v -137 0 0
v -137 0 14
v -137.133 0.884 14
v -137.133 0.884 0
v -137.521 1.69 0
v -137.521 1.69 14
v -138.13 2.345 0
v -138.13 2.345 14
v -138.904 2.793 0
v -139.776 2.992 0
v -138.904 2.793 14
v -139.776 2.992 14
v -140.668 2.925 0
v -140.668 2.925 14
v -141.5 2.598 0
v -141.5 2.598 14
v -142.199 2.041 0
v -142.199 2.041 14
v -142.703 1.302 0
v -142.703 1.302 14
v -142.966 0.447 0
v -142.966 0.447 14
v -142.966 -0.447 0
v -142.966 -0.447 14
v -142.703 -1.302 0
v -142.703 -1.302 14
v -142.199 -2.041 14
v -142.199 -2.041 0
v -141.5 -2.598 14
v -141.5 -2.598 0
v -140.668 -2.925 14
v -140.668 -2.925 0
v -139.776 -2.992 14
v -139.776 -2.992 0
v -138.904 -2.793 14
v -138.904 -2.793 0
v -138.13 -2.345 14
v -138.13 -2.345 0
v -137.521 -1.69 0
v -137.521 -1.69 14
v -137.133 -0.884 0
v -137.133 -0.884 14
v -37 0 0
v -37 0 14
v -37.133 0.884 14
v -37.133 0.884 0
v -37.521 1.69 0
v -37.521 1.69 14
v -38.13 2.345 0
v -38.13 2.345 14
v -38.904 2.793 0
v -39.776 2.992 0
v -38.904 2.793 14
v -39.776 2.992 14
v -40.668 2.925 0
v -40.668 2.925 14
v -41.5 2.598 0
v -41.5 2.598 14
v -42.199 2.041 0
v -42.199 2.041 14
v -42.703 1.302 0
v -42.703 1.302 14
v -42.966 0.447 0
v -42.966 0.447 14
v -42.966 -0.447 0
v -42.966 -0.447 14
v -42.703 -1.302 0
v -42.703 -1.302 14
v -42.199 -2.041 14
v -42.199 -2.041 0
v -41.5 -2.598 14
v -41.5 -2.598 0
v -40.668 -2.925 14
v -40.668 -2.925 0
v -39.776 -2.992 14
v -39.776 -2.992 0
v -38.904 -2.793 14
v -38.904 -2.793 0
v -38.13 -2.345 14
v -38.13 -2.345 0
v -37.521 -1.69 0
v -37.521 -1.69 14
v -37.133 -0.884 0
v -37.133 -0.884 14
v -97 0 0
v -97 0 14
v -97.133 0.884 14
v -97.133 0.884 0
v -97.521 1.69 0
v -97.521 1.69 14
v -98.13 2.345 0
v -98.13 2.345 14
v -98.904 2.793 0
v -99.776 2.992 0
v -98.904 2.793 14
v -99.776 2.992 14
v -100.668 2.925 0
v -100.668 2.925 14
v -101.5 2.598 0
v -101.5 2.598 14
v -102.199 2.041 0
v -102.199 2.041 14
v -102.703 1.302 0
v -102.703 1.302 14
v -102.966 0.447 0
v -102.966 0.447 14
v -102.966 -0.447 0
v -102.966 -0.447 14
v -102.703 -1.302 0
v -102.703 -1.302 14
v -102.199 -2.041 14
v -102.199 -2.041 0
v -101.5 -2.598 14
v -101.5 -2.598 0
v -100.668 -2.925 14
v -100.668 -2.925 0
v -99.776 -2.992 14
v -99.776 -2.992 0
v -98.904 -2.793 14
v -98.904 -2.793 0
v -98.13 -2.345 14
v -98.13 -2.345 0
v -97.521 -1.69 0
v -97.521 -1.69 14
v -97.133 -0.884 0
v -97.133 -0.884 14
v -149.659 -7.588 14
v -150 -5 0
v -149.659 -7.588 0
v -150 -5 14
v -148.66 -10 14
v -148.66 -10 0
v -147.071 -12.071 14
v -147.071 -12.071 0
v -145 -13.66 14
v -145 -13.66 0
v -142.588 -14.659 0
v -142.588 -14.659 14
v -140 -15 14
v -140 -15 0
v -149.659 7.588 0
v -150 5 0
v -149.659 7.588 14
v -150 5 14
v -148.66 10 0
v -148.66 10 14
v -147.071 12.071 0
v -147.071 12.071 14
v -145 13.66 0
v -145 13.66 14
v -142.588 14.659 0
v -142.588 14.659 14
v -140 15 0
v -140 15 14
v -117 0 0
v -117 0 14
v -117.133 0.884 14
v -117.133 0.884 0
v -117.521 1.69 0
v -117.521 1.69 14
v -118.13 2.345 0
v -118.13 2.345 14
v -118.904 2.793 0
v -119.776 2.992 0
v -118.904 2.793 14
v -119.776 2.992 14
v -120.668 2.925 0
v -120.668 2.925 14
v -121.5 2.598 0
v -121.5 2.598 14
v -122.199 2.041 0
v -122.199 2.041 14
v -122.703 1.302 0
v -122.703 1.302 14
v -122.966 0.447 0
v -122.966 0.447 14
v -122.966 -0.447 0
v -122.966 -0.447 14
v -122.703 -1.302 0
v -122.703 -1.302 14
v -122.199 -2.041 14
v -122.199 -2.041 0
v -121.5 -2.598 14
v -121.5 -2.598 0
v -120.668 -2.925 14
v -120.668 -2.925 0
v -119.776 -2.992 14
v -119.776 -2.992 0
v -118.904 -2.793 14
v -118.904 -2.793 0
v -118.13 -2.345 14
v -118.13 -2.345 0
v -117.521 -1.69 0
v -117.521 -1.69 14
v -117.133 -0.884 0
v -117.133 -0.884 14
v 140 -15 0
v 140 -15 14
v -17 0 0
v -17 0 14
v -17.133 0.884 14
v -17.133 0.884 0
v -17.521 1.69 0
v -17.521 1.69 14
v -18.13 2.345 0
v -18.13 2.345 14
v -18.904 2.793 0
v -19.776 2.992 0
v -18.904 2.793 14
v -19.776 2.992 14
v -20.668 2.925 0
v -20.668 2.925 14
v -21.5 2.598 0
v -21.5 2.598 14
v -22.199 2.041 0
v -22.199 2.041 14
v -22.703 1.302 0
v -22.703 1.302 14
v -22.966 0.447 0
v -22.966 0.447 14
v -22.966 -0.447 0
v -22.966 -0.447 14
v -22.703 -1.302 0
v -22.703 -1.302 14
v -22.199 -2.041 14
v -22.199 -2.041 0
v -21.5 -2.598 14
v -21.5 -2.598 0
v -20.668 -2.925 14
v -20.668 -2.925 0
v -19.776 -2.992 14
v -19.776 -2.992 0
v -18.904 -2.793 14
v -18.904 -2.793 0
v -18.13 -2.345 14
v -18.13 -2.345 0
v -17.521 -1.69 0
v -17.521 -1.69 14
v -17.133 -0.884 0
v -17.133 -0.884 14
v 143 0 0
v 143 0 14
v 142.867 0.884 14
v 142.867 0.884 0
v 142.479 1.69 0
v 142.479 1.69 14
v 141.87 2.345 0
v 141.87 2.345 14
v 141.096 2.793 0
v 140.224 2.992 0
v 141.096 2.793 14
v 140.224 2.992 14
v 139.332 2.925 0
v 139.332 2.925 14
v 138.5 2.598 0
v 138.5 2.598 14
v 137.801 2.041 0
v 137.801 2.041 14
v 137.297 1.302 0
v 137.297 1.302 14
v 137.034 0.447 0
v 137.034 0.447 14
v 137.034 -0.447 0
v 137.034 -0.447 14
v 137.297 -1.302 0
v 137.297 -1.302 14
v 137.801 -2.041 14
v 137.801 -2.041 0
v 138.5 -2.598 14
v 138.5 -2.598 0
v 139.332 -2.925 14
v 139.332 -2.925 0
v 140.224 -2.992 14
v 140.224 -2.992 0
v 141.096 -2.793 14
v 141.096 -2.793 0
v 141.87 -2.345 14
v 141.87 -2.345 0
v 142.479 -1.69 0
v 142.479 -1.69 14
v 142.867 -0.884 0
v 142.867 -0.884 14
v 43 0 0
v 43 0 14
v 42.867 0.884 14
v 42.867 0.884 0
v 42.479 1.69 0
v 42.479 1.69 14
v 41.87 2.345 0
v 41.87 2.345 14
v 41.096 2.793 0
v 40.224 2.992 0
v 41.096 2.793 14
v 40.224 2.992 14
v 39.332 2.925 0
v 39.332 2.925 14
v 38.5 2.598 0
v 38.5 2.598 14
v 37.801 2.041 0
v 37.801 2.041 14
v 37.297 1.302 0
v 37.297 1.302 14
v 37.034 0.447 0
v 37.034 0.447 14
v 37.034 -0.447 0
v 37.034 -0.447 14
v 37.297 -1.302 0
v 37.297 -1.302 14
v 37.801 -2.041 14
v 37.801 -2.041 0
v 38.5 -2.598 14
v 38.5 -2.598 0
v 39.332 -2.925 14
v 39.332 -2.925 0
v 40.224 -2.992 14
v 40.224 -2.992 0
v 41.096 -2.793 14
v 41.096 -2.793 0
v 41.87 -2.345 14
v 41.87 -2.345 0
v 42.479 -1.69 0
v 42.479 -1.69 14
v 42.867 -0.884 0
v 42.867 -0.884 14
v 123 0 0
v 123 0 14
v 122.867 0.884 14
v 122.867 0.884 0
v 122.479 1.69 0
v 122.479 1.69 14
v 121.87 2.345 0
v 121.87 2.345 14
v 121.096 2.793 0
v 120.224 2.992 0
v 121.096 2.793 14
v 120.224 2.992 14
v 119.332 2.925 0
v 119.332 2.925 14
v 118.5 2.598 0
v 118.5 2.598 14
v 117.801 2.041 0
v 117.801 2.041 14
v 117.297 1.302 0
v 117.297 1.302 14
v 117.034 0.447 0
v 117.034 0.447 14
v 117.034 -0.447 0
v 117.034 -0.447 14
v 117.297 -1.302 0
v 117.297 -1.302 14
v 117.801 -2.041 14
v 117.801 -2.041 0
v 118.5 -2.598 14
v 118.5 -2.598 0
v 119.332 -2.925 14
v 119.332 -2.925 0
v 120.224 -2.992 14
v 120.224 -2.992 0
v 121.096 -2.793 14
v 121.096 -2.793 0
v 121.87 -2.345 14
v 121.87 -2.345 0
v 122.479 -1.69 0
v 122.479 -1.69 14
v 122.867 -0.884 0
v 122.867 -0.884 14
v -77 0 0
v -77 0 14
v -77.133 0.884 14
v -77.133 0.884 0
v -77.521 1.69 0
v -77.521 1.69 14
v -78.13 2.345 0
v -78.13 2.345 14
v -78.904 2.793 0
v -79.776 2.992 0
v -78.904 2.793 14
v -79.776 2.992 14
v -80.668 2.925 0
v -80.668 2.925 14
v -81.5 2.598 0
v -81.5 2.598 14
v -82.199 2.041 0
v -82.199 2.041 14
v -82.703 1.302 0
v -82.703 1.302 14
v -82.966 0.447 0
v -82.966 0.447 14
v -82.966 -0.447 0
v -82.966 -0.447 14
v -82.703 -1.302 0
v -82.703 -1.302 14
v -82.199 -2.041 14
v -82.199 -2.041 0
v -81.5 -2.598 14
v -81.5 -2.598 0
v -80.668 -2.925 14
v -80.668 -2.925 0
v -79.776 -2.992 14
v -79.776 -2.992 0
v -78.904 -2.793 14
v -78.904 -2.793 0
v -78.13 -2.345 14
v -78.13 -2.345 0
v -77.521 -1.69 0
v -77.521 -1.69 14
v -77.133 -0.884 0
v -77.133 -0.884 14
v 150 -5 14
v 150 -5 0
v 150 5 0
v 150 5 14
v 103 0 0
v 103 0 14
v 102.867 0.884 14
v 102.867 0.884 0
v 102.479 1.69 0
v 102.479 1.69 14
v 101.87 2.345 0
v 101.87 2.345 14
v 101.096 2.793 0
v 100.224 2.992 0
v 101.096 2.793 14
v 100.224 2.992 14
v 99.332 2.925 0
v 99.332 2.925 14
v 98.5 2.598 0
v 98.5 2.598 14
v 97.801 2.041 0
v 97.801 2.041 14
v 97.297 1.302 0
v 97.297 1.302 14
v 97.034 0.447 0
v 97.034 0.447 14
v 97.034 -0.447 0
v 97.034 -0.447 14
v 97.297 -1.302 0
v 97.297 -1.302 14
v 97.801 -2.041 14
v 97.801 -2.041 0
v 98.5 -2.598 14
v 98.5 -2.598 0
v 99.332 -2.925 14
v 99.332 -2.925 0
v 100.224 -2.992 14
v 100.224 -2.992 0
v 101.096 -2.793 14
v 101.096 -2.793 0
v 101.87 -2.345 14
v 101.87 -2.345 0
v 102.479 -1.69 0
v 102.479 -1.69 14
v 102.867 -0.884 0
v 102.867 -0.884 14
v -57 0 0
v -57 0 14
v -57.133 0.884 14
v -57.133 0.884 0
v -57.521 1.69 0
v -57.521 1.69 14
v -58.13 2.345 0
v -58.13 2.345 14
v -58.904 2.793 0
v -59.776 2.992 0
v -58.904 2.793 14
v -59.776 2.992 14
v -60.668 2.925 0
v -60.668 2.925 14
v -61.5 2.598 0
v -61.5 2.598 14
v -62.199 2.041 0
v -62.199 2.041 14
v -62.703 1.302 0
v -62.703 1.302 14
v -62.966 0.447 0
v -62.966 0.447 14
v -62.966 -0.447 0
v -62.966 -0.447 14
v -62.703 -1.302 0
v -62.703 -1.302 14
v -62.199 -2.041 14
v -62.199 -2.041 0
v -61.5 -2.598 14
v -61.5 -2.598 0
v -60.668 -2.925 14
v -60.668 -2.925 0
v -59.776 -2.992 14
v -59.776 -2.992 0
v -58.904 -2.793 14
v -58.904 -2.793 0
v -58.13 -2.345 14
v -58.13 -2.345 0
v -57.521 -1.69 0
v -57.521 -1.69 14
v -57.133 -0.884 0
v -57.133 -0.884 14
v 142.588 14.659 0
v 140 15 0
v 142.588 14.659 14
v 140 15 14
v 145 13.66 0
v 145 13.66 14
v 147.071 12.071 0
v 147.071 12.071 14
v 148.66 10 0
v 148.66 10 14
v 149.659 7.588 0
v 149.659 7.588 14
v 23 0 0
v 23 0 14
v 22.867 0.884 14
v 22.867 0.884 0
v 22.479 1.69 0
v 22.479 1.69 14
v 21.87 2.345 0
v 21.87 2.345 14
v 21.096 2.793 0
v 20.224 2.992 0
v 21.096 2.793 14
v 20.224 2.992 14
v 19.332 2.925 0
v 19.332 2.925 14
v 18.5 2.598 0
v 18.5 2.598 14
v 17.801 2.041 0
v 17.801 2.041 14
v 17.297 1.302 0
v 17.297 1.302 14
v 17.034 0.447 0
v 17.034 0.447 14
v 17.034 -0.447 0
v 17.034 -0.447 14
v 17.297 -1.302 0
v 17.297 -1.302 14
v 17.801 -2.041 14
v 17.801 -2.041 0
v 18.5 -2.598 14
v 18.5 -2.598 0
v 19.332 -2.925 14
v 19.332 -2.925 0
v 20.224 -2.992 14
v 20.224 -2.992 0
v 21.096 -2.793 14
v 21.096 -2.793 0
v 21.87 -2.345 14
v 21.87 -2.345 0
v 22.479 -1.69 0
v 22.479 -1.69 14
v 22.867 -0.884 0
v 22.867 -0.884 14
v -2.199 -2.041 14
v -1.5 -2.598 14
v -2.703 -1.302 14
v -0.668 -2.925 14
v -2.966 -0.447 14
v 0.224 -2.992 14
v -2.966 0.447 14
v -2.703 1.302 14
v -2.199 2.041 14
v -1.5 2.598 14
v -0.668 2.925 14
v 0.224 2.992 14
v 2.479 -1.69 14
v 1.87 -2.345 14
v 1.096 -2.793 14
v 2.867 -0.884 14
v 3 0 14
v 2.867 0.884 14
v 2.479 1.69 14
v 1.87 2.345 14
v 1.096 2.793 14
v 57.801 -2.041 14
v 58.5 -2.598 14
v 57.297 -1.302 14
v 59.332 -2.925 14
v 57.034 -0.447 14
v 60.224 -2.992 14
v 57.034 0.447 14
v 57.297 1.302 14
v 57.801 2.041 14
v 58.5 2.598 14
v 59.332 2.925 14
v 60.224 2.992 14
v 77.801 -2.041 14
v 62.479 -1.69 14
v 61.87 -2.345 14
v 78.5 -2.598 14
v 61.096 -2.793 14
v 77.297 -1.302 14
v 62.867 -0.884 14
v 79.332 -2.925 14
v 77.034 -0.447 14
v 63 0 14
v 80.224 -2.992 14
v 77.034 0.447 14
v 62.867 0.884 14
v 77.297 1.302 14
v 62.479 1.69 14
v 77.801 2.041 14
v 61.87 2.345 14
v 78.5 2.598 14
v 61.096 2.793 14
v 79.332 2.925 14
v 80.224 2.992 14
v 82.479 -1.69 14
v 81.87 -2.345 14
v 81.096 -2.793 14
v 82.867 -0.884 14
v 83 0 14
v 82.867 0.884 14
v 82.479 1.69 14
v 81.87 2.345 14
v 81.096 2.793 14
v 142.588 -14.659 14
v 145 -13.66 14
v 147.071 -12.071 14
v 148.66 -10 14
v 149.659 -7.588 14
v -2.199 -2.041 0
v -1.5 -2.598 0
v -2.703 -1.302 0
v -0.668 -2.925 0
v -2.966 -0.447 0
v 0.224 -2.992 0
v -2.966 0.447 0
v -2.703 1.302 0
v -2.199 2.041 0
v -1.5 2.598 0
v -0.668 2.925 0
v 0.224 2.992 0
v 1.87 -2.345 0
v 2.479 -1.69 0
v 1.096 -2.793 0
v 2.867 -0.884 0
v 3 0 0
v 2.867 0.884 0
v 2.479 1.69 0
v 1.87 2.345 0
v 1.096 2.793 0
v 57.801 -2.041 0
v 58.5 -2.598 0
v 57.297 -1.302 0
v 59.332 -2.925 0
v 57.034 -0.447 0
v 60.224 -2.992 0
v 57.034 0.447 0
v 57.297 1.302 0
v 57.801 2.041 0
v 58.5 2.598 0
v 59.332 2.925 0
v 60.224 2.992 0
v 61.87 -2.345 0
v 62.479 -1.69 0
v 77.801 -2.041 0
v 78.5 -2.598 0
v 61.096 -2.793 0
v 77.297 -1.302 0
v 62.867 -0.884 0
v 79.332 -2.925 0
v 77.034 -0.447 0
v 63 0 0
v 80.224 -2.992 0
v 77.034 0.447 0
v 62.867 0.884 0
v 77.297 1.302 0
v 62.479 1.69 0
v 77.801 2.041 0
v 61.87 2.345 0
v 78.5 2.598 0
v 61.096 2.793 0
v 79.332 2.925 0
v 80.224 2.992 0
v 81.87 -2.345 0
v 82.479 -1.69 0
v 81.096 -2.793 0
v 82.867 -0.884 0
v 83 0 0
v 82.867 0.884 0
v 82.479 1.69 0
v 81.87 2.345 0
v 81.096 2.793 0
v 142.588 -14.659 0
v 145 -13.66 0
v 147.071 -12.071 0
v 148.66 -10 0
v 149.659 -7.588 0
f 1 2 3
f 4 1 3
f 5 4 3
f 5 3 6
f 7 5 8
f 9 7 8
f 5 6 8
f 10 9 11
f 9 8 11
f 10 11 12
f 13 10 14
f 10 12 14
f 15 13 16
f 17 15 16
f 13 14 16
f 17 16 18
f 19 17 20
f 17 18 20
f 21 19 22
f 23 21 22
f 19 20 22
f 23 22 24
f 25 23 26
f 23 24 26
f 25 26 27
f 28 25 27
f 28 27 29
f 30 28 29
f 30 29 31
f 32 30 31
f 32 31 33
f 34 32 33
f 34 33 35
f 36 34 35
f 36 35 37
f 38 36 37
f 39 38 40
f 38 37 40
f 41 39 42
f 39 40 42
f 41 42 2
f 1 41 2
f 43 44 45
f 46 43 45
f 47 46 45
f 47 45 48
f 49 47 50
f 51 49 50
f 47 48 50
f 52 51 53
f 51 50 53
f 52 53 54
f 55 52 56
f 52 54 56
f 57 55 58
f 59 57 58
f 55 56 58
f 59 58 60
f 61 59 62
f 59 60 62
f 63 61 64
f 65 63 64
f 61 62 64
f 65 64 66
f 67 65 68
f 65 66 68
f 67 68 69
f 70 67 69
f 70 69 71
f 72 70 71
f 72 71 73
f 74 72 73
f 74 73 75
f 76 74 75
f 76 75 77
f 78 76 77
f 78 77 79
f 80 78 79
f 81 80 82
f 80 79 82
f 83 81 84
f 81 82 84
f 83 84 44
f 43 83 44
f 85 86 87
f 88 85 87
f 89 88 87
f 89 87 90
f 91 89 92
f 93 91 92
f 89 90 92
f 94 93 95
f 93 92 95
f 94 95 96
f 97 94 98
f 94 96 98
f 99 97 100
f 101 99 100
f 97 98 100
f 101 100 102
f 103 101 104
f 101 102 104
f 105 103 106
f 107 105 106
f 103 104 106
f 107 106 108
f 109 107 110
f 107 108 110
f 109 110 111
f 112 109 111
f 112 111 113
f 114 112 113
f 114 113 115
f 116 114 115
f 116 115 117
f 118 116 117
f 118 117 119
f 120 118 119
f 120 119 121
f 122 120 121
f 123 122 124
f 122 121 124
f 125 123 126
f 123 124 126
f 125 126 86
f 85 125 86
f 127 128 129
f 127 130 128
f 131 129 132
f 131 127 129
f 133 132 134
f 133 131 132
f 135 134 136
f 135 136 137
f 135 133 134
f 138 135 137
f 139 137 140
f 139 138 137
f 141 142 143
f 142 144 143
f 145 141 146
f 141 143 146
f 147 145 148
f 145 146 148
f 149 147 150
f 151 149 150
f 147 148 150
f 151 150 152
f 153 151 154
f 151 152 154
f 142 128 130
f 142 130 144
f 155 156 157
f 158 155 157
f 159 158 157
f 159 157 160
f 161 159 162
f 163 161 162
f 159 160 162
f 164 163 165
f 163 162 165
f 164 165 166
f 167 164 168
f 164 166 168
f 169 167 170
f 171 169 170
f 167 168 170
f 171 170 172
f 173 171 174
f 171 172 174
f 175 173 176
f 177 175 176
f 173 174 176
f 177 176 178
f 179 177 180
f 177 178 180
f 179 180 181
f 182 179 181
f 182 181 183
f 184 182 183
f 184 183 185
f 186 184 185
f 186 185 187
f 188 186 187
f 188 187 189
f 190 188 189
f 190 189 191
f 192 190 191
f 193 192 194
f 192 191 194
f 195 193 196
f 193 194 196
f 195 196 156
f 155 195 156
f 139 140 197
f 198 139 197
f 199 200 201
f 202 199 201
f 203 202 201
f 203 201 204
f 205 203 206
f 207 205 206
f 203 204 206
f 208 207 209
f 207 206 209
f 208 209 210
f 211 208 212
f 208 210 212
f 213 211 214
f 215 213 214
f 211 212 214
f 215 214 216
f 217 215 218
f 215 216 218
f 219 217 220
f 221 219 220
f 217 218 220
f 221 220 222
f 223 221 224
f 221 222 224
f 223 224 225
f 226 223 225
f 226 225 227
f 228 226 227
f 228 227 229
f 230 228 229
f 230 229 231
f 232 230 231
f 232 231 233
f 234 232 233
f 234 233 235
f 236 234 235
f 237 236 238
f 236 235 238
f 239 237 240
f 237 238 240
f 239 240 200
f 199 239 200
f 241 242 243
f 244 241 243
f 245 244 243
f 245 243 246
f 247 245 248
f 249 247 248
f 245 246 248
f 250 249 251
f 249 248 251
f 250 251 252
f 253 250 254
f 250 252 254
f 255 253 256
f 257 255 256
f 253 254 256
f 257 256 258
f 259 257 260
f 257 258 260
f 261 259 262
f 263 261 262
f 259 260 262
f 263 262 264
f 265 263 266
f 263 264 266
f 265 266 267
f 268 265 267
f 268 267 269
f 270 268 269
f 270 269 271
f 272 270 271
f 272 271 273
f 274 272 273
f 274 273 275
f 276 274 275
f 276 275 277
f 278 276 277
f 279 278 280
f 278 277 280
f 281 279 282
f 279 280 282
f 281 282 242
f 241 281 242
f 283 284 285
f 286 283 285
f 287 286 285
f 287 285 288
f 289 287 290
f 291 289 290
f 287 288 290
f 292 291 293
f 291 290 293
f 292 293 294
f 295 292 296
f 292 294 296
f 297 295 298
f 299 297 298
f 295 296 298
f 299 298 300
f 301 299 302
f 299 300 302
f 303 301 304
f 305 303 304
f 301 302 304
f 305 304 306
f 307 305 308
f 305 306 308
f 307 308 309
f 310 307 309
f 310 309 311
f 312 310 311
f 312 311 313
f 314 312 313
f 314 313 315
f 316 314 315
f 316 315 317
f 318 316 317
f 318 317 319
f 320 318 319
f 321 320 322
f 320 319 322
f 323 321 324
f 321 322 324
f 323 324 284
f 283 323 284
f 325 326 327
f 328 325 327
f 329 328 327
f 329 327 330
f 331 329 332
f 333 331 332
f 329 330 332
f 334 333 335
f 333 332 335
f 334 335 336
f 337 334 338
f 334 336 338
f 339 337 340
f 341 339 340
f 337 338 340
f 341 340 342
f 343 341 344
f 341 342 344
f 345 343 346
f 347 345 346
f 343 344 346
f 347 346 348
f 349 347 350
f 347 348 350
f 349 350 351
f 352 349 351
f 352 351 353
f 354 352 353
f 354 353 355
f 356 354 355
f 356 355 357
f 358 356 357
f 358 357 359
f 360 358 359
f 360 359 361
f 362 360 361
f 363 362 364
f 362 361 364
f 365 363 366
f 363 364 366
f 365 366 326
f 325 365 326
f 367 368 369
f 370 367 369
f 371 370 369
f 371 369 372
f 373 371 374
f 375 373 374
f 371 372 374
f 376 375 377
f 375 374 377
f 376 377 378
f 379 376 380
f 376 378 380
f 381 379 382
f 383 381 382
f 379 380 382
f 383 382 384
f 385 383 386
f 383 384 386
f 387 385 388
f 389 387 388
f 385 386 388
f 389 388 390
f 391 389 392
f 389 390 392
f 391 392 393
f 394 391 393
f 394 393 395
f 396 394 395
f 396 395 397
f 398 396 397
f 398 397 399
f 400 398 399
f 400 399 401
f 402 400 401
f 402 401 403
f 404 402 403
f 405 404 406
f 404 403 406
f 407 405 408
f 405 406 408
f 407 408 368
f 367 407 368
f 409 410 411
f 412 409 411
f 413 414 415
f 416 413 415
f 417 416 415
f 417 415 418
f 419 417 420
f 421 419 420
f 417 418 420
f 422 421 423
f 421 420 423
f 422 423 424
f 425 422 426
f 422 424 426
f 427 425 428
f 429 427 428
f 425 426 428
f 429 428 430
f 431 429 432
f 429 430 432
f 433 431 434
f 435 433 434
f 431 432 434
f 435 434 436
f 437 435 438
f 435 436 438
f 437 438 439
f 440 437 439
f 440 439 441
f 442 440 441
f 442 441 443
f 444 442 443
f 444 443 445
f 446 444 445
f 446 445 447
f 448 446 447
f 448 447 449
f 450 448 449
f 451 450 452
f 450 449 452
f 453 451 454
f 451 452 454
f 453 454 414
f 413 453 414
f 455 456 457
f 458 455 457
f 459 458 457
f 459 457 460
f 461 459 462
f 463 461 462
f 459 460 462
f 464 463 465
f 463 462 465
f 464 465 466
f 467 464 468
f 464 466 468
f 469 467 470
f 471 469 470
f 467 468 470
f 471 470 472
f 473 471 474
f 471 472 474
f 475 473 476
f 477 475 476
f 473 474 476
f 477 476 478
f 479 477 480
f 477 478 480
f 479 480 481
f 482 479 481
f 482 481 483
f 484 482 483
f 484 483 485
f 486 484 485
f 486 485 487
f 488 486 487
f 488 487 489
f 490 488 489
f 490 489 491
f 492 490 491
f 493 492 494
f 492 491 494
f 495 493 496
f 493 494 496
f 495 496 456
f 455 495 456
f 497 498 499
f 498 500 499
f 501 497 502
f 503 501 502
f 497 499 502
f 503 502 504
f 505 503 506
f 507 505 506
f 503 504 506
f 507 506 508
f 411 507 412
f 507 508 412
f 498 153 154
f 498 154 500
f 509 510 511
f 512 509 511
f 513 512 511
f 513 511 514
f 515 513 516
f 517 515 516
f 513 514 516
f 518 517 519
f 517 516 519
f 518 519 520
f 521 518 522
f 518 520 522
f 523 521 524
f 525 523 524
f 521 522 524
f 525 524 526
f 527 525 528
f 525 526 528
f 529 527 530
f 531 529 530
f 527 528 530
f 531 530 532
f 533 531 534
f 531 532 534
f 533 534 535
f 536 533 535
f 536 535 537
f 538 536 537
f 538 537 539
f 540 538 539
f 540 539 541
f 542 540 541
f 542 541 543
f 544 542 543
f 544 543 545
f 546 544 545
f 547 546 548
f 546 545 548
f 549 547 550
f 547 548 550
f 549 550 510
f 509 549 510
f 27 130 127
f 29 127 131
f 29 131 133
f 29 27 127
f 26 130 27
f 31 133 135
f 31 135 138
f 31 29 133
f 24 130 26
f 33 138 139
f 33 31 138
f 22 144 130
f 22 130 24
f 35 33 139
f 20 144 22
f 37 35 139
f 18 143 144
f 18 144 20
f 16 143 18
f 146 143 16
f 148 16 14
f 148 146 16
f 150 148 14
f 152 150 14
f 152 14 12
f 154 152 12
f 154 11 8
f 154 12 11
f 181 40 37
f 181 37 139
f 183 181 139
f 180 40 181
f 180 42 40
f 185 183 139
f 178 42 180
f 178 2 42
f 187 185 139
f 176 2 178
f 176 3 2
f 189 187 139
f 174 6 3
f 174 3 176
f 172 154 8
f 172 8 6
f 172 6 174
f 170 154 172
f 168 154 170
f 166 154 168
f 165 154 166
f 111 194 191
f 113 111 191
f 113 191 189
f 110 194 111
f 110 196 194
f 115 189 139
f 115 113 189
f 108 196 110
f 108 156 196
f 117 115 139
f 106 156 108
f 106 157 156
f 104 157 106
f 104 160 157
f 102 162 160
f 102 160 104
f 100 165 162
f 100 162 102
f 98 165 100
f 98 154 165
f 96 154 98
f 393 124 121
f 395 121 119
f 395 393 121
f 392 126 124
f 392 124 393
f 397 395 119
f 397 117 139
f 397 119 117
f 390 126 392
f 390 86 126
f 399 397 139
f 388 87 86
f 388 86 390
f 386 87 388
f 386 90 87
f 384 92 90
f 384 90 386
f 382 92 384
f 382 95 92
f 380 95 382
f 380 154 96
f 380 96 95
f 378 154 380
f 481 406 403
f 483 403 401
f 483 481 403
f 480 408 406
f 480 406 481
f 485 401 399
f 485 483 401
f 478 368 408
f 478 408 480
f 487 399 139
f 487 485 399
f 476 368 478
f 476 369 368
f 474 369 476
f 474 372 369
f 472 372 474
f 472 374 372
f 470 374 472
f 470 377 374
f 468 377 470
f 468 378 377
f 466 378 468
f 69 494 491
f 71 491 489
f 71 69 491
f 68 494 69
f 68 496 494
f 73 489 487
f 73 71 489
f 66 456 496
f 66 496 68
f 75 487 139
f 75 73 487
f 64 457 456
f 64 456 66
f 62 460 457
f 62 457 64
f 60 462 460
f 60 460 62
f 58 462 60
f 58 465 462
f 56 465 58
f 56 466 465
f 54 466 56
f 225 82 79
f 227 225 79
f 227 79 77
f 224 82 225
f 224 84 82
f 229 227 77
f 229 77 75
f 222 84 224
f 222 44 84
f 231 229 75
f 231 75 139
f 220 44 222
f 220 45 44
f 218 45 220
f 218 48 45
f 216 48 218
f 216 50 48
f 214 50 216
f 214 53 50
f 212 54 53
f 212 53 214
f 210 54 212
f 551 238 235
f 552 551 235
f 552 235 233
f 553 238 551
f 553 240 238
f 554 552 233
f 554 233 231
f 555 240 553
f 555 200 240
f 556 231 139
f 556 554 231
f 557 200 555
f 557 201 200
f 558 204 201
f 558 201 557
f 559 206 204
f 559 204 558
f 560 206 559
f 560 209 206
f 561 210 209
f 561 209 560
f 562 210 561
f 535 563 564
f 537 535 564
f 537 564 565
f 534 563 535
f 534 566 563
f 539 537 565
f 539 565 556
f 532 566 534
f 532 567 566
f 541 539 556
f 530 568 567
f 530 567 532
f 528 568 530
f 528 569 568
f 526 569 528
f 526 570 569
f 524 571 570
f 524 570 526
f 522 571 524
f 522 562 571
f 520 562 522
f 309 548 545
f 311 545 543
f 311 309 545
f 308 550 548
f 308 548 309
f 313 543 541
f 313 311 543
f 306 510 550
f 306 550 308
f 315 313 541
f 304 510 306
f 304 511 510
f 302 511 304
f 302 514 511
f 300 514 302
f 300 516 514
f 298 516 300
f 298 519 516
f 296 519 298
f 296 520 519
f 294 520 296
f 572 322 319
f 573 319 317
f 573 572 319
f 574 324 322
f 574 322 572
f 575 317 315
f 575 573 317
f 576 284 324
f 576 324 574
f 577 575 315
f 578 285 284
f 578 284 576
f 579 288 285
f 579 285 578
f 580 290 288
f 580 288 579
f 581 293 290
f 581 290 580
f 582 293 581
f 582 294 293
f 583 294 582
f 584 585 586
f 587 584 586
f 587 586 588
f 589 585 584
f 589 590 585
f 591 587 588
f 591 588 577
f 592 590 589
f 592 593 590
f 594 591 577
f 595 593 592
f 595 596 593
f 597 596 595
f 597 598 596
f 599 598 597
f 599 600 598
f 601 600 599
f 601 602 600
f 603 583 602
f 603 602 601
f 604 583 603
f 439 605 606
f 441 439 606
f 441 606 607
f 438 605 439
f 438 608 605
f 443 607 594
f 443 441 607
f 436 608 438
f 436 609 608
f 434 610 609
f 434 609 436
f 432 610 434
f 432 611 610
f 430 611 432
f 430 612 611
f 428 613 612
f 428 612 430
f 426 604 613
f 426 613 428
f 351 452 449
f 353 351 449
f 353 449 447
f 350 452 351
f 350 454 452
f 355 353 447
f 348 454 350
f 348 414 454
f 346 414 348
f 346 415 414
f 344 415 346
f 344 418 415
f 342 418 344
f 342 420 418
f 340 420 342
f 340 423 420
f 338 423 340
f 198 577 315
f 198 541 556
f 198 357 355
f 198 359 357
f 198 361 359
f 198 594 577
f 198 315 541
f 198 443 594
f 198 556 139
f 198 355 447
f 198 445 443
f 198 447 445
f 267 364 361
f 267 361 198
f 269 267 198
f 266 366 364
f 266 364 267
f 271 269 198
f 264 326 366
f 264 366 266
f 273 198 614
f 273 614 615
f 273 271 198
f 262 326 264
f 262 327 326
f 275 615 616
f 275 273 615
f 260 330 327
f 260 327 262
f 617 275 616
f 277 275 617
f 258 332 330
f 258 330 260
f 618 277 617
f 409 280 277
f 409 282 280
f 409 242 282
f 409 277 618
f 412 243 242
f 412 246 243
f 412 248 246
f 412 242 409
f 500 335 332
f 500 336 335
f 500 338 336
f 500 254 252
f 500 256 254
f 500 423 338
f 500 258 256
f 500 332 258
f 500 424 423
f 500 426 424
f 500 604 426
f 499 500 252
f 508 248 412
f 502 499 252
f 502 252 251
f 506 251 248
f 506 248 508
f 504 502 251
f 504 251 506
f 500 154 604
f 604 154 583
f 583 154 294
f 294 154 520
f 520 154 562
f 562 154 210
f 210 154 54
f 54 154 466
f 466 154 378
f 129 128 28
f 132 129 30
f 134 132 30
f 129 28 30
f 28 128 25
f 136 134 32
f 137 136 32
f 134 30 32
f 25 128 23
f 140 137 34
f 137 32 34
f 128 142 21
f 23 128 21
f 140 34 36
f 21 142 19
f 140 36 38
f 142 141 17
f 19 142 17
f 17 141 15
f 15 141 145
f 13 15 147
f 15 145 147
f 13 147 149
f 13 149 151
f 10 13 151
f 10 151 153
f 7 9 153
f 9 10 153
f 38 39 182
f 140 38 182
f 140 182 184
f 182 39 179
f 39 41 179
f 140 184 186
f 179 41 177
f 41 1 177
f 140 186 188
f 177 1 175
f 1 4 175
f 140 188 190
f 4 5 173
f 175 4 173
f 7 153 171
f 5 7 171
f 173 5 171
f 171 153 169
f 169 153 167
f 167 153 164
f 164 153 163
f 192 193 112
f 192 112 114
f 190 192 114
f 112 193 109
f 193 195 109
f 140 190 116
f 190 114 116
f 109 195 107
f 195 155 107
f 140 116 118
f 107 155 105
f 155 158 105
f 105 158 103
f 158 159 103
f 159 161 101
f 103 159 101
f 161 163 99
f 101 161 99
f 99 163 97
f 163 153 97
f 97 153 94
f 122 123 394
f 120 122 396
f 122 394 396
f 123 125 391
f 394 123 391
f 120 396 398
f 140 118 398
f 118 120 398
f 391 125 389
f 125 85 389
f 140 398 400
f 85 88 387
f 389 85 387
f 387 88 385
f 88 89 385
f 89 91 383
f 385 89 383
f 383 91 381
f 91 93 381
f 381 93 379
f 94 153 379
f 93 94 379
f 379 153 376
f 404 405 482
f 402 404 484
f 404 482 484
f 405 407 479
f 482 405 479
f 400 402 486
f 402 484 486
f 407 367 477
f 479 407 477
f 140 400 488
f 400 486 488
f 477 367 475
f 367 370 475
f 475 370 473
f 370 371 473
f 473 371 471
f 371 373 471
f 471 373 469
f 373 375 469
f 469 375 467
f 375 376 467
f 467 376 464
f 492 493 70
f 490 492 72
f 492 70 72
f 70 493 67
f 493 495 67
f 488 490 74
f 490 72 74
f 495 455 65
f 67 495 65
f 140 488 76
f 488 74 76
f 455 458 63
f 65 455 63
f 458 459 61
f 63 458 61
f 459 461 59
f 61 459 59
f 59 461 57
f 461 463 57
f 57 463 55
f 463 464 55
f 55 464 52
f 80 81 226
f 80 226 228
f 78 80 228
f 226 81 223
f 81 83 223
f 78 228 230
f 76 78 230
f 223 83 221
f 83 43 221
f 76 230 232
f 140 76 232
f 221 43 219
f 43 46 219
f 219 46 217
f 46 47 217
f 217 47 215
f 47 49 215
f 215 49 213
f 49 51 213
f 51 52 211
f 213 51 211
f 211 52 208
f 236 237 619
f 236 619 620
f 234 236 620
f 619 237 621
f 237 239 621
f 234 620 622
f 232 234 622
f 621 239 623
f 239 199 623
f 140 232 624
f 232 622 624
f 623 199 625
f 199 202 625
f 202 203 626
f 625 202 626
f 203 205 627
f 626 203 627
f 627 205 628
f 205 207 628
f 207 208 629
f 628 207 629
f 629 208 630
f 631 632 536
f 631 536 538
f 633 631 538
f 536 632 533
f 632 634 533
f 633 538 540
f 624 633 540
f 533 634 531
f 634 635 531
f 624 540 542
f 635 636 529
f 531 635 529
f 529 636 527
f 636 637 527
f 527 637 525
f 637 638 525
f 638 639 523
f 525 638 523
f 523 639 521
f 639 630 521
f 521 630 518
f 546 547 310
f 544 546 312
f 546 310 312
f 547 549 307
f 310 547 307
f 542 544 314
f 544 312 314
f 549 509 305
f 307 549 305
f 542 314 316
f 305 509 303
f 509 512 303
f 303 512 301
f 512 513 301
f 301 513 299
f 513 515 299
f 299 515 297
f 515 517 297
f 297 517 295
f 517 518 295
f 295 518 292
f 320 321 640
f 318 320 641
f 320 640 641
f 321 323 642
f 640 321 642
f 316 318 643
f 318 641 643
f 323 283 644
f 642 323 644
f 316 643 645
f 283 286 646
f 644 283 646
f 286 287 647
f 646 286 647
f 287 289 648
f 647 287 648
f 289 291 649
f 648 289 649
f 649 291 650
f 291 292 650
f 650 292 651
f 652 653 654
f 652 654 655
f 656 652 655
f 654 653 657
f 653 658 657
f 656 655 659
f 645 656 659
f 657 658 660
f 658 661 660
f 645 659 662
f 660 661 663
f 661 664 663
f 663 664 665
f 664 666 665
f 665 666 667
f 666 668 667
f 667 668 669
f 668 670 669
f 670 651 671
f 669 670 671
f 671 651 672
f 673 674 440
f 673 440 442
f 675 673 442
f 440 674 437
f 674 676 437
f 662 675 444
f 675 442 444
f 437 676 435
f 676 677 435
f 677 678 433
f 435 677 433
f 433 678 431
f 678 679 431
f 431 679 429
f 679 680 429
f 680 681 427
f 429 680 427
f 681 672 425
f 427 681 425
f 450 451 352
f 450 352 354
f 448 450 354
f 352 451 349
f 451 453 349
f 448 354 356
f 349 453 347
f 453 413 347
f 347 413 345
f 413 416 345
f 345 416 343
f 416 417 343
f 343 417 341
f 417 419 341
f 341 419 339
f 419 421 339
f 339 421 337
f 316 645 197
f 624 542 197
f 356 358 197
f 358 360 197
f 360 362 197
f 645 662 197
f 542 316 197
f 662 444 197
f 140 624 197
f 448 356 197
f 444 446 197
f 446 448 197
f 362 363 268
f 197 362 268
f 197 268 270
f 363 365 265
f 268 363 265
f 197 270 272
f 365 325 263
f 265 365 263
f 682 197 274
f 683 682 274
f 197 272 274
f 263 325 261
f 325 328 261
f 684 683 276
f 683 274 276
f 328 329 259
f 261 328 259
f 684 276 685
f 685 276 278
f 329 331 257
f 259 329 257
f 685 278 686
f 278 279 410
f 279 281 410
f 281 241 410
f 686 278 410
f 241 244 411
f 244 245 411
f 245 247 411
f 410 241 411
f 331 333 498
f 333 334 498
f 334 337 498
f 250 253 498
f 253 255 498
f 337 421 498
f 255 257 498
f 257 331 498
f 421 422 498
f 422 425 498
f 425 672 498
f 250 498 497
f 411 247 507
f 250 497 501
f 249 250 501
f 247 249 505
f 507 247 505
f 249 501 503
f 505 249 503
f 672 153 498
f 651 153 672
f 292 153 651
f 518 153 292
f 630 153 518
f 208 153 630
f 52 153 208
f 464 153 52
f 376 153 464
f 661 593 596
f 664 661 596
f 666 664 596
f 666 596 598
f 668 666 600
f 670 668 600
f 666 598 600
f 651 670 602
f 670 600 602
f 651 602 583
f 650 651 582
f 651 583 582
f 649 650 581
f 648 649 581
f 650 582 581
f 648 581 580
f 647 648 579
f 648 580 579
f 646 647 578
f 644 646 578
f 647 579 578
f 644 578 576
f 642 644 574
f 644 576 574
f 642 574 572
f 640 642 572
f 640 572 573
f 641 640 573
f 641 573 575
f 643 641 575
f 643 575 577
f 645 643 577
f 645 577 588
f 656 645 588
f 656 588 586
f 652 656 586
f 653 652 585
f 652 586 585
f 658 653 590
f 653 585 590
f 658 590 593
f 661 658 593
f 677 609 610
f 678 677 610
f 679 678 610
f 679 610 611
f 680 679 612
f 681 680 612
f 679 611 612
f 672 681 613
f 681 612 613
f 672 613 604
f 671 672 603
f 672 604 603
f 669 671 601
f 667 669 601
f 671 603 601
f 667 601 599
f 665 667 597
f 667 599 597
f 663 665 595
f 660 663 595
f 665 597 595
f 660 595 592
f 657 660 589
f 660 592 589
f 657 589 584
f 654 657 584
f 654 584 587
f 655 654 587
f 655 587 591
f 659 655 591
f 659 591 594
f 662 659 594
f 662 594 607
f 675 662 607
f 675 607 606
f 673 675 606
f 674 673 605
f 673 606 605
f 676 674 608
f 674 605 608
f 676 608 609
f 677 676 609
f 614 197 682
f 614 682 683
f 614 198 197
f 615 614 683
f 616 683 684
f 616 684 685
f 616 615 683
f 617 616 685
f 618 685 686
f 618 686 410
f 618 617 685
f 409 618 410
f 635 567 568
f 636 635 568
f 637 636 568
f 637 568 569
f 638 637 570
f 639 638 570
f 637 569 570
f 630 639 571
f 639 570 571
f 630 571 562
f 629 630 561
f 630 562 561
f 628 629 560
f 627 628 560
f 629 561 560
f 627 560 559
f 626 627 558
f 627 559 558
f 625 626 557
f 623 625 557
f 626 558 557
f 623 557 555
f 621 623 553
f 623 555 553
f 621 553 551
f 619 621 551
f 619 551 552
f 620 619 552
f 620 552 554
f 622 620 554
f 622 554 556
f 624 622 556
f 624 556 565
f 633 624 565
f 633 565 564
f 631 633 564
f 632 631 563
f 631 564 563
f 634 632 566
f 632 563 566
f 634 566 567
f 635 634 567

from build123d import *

# Parameters (mm, degrees)
SKETCH1_W           = 300
SKETCH1_H           = 30
BOSS_EXTRUDE1_DEPTH = 14
SKETCH2_R           = 3
CUT_EXTRUDE1_DEPTH  = 14
FILLET1_R           = 10


with BuildPart() as part:
    # Sketch1 → Boss-Extrude1 (new body)
    with BuildSketch(Plane.XY):
        Rectangle(SKETCH1_W, SKETCH1_H)
    extrude(amount=BOSS_EXTRUDE1_DEPTH)

    # Sketch2 → Cut-Extrude1 (cut)
    with BuildSketch(Plane.XY.offset(14)):
        with Locations((100, 0)):
            Circle(SKETCH2_R)
        with Locations((-100, 0)):
            Circle(SKETCH2_R)
        with Locations((-140, 0)):
            Circle(SKETCH2_R)
        with Locations((-120, 0)):
            Circle(SKETCH2_R)
        with Locations((120, 0)):
            Circle(SKETCH2_R)
        with Locations((140, 0)):
            Circle(SKETCH2_R)
        with Locations((-80, 0)):
            Circle(SKETCH2_R)
        with Locations((80, 0)):
            Circle(SKETCH2_R)
        with Locations((-60, 0)):
            Circle(SKETCH2_R)
        with Locations((-40, 0)):
            Circle(SKETCH2_R)
        with Locations((60, 0)):
            Circle(SKETCH2_R)
        with Locations((40, 0)):
            Circle(SKETCH2_R)
        with Locations((-20, 0)):
            Circle(SKETCH2_R)
        Circle(SKETCH2_R)
        with Locations((20, 0)):
            Circle(SKETCH2_R)
    extrude(amount=-CUT_EXTRUDE1_DEPTH, mode=Mode.SUBTRACT)

    # Fillet1
    fillet1_edges = [part.edges().sort_by_distance(p)[0] for p in [
        (150, -15, 7),
        (-150, -15, 7),
        (-150, 15, 7),
        (150, 15, 7),
    ]]
    fillet(fillet1_edges, radius=FILLET1_R)


solid = part.part
